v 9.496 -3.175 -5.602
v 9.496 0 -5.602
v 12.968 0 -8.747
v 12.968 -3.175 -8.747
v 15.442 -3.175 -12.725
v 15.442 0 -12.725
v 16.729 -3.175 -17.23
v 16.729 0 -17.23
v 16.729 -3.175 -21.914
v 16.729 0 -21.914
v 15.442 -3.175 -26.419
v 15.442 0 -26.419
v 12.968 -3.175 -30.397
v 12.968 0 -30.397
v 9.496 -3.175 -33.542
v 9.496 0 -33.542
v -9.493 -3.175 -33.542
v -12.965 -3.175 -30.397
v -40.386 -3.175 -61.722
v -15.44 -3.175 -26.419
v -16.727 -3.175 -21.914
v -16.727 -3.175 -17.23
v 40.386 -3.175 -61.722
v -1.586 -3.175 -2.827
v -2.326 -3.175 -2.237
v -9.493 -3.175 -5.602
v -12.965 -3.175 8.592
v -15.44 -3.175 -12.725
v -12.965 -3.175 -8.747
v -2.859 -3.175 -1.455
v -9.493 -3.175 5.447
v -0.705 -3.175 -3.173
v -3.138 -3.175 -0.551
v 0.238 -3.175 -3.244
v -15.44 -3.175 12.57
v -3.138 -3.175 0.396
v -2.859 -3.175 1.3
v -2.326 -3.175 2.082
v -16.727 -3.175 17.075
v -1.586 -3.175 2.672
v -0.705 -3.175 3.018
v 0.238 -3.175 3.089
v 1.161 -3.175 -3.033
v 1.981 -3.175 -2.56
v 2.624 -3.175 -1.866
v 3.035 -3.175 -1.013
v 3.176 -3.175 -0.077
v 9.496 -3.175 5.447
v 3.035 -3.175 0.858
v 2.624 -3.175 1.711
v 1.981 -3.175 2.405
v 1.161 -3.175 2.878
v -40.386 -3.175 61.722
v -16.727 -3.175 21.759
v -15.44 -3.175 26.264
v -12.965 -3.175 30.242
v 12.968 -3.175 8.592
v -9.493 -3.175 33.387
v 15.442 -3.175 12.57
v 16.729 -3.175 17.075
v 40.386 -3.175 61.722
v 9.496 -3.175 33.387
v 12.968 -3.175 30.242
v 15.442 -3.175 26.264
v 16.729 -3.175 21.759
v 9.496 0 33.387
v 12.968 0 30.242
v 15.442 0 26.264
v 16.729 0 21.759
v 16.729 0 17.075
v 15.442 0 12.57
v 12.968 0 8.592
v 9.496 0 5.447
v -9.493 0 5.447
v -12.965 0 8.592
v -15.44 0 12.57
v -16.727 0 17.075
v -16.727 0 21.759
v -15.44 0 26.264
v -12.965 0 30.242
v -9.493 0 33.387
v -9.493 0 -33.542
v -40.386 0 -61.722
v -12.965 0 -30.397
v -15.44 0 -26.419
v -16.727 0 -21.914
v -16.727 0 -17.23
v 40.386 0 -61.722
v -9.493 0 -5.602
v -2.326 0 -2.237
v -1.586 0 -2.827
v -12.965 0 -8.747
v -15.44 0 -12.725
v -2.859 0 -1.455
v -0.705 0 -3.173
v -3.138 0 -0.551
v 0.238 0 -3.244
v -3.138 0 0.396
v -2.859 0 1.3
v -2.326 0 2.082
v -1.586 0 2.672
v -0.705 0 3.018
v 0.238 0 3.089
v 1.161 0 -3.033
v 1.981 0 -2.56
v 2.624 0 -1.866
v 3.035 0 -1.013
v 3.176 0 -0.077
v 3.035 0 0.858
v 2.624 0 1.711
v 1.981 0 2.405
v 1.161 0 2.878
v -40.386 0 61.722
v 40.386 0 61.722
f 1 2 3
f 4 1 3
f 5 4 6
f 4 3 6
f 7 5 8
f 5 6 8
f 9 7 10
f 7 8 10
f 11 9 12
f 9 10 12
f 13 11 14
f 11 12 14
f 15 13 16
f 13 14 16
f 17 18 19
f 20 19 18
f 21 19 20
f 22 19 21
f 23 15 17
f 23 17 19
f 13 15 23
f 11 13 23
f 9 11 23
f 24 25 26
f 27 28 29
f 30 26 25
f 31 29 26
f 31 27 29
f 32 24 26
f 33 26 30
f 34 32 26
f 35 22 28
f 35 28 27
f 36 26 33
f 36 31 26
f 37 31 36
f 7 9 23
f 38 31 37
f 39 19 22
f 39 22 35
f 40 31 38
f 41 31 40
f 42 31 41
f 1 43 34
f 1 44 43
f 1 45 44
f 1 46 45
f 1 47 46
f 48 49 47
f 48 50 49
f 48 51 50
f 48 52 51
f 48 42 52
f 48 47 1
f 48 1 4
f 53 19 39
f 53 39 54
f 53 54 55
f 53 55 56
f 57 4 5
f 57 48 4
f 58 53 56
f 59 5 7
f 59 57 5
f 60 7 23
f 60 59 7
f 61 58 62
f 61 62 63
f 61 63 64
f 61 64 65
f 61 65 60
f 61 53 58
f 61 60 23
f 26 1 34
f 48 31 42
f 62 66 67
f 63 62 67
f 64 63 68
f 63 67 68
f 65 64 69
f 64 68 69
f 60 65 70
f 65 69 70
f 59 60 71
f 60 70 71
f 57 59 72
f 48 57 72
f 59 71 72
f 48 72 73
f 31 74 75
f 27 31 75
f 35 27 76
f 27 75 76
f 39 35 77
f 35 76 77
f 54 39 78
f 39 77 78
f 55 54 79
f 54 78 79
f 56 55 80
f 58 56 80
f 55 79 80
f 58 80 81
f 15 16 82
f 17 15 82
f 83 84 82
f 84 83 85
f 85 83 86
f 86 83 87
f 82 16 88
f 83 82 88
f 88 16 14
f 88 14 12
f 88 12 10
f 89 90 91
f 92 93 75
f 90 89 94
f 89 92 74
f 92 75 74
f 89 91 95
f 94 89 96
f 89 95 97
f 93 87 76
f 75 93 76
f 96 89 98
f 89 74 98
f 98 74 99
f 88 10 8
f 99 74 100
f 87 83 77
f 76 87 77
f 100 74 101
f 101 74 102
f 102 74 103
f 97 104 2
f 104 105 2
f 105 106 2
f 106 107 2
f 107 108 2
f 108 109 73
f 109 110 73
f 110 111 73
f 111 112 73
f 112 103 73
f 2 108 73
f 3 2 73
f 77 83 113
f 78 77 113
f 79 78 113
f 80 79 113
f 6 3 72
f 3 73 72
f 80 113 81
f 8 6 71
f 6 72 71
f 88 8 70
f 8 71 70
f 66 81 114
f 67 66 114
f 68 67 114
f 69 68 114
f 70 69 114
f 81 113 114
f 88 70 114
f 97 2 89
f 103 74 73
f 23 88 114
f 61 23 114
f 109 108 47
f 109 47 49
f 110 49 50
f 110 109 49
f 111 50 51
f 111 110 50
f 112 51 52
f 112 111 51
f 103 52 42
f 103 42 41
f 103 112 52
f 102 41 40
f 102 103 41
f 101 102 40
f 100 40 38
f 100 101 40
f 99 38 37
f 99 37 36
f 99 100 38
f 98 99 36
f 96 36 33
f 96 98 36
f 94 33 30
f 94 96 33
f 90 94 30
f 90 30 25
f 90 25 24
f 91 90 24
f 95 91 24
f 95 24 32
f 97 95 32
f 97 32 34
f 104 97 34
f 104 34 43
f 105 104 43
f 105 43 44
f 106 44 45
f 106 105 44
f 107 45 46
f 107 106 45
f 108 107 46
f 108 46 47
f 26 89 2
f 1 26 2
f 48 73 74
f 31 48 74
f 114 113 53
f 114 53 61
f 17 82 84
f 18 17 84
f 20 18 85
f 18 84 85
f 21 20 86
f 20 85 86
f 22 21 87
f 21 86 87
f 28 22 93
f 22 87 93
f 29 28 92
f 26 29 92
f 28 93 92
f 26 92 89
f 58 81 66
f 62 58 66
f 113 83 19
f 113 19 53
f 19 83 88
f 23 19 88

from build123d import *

# Parameters (mm, degrees)
F0_W     = 80.772
F0_H     = 123.444
F0_R     = 3.175
F1_DEPTH = 3.175


# Not quite as in the source:
# - ends of sketch curves that miss each other by under 0.0002 mm in the source are joined


with BuildPart() as f1:
    # F0 (on Front) → F1 (new body)
    with BuildSketch(Plane.XZ):
        Rectangle(F0_W, F0_H)
        with BuildLine():
            ThreePointArc((-9.4932913315, -33.5419135021), (-16.889821539, -19.5719126303), (-9.4932913315, -5.6019117584))
            Line((-9.4932913315, -5.6019117584), (9.495647661, -5.6019126303))
            ThreePointArc((9.495647661, -5.6019126303), (16.892178461, -19.5719126303), (9.4956482536, -33.5419135021))
            Line((9.4956482536, -33.5419135021), (-9.4932913315, -33.5419135021))
        make_face(mode=Mode.SUBTRACT)
        with Locations((0.001178461, -0.0774126303)):
            Circle(F0_R, mode=Mode.SUBTRACT)
        with BuildLine():
            ThreePointArc((-9.4932913315, 5.4470864979), (-16.889821539, 19.4170873697), (-9.4932913315, 33.3870882416))
            Line((-9.4932913315, 33.3870882416), (9.495647661, 33.3870873697))
            ThreePointArc((9.495647661, 33.3870873697), (16.892178461, 19.4170873697), (9.4956482536, 5.4470864979))
            Line((9.4956482536, 5.4470864979), (-9.4932913315, 5.4470864979))
        make_face(mode=Mode.SUBTRACT)
    extrude(amount=F1_DEPTH)


solid = f1.part
